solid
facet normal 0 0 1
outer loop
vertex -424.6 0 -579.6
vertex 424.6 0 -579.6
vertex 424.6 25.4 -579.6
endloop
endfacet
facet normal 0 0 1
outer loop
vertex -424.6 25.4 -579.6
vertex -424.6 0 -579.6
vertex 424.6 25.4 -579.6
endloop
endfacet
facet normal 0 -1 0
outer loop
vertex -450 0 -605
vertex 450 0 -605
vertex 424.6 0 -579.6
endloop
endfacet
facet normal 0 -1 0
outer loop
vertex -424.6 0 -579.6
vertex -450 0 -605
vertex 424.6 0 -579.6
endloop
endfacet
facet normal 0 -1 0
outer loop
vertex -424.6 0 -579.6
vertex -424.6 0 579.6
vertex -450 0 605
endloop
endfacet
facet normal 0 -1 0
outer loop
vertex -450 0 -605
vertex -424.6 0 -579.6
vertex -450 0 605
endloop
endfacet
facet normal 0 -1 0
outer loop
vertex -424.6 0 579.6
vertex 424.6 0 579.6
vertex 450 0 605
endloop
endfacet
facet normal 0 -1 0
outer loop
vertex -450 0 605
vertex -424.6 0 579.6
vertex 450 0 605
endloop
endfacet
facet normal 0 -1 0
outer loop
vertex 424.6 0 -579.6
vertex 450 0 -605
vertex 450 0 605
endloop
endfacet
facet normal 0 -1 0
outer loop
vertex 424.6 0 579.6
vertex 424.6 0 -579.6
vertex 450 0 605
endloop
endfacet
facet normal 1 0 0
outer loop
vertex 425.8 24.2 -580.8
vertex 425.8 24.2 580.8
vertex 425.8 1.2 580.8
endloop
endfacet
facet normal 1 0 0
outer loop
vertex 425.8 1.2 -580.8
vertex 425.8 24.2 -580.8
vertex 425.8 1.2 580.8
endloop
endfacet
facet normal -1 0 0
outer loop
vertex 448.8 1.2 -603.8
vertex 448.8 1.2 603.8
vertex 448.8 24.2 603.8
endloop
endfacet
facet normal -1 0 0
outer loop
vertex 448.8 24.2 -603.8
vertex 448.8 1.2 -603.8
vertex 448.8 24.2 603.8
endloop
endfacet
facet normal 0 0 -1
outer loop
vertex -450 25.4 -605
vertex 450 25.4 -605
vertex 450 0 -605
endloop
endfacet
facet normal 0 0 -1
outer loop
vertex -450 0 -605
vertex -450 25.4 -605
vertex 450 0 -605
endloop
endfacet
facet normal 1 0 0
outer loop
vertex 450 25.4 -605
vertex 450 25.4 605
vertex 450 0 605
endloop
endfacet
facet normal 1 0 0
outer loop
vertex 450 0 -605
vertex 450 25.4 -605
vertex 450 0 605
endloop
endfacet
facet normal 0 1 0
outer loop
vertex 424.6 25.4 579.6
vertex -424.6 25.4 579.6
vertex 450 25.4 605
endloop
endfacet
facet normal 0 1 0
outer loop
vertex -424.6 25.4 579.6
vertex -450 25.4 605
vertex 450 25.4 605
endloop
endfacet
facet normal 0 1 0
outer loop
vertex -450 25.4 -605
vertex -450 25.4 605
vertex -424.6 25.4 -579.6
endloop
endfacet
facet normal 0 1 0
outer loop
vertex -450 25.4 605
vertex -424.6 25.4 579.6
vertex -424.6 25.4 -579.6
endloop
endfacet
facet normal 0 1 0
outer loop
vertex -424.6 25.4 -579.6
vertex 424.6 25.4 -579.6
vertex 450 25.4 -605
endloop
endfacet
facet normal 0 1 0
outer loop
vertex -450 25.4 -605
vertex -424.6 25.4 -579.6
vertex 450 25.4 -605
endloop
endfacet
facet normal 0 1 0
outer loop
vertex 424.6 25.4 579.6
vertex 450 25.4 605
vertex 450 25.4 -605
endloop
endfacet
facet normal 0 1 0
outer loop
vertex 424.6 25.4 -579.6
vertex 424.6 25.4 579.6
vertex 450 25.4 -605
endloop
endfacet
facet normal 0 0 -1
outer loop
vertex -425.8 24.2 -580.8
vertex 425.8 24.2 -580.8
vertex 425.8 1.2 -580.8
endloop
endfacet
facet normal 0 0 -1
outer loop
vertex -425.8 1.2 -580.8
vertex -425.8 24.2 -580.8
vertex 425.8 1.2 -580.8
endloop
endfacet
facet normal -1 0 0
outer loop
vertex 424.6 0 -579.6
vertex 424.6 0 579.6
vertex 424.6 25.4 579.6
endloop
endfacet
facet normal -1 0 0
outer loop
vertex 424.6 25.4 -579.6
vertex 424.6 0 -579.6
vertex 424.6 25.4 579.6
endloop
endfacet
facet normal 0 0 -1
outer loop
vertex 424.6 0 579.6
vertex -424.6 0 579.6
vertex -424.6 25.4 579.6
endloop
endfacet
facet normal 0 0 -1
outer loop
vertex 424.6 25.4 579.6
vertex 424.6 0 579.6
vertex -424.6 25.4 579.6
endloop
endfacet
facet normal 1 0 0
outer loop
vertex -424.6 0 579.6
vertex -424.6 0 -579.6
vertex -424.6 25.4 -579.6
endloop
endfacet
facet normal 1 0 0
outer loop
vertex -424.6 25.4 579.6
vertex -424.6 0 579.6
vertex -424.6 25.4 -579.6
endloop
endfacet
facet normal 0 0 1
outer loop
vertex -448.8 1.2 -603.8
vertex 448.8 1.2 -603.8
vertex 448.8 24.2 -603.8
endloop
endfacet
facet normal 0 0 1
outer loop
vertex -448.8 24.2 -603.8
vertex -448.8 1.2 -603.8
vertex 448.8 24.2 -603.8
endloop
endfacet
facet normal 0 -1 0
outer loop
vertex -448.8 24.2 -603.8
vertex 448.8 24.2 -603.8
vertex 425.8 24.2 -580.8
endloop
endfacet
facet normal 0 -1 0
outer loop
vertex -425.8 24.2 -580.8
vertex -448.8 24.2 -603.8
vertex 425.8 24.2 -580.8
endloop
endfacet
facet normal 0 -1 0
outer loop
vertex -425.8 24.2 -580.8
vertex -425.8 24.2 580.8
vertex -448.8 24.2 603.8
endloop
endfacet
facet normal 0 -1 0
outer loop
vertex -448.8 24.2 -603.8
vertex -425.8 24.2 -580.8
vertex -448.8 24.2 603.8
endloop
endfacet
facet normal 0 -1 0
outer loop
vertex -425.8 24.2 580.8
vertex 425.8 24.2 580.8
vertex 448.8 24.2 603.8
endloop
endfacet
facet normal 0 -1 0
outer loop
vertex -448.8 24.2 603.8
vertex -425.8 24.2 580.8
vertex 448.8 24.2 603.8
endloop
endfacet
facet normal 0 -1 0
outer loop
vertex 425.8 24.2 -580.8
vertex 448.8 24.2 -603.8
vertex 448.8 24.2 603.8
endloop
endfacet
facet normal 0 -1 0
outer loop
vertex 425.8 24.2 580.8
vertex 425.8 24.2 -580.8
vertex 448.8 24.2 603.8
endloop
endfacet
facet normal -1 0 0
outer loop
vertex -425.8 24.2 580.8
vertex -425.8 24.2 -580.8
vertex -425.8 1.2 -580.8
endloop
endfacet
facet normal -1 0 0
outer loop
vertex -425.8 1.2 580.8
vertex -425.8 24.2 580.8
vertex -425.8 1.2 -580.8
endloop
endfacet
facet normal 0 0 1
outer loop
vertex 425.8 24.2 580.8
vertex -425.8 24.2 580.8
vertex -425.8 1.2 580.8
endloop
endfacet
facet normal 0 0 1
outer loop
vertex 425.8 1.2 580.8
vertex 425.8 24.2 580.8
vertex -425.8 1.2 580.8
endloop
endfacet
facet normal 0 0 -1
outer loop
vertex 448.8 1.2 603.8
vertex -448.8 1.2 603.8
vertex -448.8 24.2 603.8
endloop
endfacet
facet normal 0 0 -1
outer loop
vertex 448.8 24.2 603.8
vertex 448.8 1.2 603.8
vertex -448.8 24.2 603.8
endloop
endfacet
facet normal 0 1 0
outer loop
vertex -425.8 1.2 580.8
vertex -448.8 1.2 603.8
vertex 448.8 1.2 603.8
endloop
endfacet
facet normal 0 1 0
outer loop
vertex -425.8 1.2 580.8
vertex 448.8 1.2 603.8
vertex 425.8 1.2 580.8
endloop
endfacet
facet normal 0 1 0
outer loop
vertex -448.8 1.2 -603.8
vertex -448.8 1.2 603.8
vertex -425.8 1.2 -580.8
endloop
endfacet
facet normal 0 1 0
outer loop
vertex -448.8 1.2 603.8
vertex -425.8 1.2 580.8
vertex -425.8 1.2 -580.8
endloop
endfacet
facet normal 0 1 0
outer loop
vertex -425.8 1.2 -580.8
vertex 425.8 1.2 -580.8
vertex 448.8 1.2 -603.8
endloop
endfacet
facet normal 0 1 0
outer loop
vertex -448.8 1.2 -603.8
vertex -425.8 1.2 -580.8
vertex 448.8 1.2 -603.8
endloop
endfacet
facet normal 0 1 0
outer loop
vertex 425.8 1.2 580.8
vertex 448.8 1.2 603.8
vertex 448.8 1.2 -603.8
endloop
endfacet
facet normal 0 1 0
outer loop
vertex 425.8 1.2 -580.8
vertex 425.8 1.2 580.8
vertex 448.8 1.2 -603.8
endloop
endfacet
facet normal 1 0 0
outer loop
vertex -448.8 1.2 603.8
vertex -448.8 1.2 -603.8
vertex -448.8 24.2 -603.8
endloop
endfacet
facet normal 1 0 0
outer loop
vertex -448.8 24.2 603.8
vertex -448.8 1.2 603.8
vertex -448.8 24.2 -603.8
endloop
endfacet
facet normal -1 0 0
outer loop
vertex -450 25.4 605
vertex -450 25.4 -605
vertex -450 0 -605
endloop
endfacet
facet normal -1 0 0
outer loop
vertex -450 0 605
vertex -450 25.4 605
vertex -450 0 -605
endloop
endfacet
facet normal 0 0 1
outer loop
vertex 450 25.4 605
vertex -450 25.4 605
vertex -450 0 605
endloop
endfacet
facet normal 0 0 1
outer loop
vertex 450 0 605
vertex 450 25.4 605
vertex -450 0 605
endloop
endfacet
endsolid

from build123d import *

# Parameters (mm, degrees)
SKETCH2_W   = 25.4
SKETCH2_H   = 25.4
SKETCH2_W_2 = 23
SKETCH2_H_2 = 23


with BuildPart() as part:
    # Sweep1: sweep along a path in Sketch1
    with BuildLine(Plane(origin=(0, 0, 0), x_dir=(1, 0, 0), z_dir=(0, 1, 0))) as sweep1_path:
        Line((-450, 605), (450, 605))
        Line((450, 605), (450, -605))
        Line((450, -605), (-450, -605))
        Line((-450, -605), (-450, 605))
    # Sketch2 → Sweep1 (sweep)
    with BuildSketch(Plane(origin=(0, 0, 0), x_dir=(0, 0, -1), z_dir=(1, 0, 0))):
        with Locations((-592.3, 12.7)):
            Rectangle(SKETCH2_W, SKETCH2_H)
        with Locations((-592.3, 12.7)):
            Rectangle(SKETCH2_W_2, SKETCH2_H_2, mode=Mode.SUBTRACT)
    sweep(path=sweep1_path.line, transition=Transition.RIGHT)


solid = part.part
